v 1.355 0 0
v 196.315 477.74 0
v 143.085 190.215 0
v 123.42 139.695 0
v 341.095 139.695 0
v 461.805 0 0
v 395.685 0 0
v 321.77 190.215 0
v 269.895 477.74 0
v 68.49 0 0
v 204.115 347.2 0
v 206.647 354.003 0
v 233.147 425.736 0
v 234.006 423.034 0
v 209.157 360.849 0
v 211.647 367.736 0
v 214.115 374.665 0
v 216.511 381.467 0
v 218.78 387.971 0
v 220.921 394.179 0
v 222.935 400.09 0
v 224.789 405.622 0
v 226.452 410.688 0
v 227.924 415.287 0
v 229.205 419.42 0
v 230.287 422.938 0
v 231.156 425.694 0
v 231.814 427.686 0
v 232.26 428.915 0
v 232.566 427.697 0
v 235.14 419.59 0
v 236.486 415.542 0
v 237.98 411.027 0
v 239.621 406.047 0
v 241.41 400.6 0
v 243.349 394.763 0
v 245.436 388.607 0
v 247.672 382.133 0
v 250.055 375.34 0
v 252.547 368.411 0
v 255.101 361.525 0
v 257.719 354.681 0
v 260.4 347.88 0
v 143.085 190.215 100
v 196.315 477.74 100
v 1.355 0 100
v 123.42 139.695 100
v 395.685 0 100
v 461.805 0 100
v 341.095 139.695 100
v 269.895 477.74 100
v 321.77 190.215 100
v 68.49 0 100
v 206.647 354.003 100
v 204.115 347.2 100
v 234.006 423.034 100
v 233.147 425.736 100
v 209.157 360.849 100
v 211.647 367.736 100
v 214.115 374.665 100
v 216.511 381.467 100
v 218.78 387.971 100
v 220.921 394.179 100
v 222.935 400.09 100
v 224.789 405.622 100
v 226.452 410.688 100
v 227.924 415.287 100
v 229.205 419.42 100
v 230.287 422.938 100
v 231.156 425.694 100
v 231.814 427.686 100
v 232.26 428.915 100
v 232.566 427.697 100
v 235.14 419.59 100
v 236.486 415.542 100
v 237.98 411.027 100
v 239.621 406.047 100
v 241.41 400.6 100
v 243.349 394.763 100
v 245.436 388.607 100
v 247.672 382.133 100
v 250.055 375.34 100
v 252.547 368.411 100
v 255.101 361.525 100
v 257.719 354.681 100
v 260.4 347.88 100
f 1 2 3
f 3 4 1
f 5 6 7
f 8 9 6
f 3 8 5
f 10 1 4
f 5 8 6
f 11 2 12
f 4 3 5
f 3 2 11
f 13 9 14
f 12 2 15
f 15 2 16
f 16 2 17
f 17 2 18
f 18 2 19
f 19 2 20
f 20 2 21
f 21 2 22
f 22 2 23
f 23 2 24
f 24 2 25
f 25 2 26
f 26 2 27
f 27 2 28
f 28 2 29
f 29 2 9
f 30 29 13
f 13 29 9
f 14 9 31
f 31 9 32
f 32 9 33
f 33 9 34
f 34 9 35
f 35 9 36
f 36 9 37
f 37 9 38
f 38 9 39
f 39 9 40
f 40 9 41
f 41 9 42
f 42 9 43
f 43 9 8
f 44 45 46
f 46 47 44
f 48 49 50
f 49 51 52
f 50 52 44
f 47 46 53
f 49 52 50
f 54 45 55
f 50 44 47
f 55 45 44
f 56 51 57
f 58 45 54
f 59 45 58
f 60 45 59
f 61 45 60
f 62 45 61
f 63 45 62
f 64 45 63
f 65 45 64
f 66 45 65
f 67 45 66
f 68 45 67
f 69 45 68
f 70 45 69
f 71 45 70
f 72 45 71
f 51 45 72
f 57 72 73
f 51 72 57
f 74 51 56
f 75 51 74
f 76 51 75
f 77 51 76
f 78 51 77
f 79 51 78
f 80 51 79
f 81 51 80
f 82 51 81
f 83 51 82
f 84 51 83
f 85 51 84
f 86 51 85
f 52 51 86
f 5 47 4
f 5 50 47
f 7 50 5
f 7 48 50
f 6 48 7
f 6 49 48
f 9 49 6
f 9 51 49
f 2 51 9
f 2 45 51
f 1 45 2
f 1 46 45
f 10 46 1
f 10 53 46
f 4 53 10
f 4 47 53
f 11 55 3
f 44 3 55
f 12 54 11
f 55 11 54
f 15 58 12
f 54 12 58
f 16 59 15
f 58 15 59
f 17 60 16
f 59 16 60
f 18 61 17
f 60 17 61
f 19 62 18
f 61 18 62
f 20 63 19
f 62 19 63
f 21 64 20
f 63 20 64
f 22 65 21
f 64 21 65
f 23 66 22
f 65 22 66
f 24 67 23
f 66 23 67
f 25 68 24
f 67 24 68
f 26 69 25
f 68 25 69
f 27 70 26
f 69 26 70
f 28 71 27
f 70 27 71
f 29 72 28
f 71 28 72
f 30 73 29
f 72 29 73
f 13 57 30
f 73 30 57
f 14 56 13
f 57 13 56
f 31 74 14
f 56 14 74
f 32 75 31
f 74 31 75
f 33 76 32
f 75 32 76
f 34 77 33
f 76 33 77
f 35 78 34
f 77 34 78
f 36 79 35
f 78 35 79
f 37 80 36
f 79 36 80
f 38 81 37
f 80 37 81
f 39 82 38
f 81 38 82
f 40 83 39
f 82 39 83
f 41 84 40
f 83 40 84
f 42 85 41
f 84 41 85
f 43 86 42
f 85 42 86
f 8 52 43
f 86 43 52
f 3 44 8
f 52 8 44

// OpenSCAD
//
// (doxygen) file header.
//

/***************************************************************************//**
  \file   design.scad
  \author Designers' Name
  \date   2016-2017

  \copyright
    Copyright notice.

  \brief
    Short design description.

  \details
    Long design description.

    \amu_make png_files ( append=scope1 extension=png ++pstarget )
    \amu_shell file_cnt ( "echo ${png_files} | wc -w" )
    \amu_shell   labels ( "seq -f '(%g)' -s '^' ${file_cnt}" )

    \htmlonly
      \amu_image_table
        (
          type=html columns=6 image_width="160"
          table_caption="Design Examples"
          cell_files="${png_files}"
          cell_captions="${labels}"
        )
    \endhtmlonly

    \amu_make eps_files ( append=scope1 extension=png2eps ++pstarget )
    \latexonly
      \amu_image_table
        (
          type=latex columns=6 image_width="1.00in"
          table_caption="Design Examples"
          cell_files="${eps_files}"
          cell_captions="${labels}"
        )
    \endlatexonly

*******************************************************************************/


//
// (doxygen) main page.
//

/***************************************************************************//**
  \mainpage Main Page
  \tableofcontents

  \section overview Overview
    Overview.

  \subsection design Design

    \ref design.scad "Design Documentation."

    \amu_combine    titles ( "v10 v11 v12" "x" "1 2" joiner=" " separator="^" )
    \amu_make    stl_files ( append=scope1 extension=stl ++pstarget )

    \amu_combine png_files ( prefix="design" "v10 v11 v12" "1 2" "diag_320x240.png" )
    \htmlonly
      \amu_image_table
        (
          type=html columns=2 image_width="160"
          table_caption="Downloadable STL"
          column_headings="Scale=1^Scale=2"
          cell_files="${png_files}"
          cell_titles="${titles}"
          cell_captions="${titles}"
          cell_urls="${stl_files}"
        )
    \endhtmlonly

    \amu_combine eps_files ( prefix="design" "v10 v11 v12" "1 2" "diag_320x240.eps" )
    \latexonly
      \amu_image_table
        (
          type=latex columns=2 image_width="1.00in"
          table_caption="Downloadable STL"
          column_headings="Scale=1^Scale=2"
          cell_files="${eps_files}"
          cell_titles="${titles}"
          cell_captions="${titles}"
          cell_urls="${stl_files}"
        )
    \endlatexonly

  \subsection library Library

    \ref library.scad "Library Documentation."

    \amu_shell        seq4 ( "seq -f '(%g)' -s '^' 4" )
    \amu_combine    titles ( prefix="Example" "A B C D" suffix="." joiner=" " separator="^" )
    \amu_make    stl_files ( set="library" append=scope1 extension=stl )

    \amu_combine png_files ( prefix="library_scope2" "A B C D" "2" "diag_320x240.png" )
    \htmlonly
      \amu_image_table
        (
          type=html columns=4 image_width="160"
          table_caption="Downloadable STL"
          column_headings="${seq4}"
          cell_files="${png_files}"
          cell_titles="${titles}"
          cell_captions="${titles}"
          cell_urls="${stl_files}"
        )
    \endhtmlonly

    \amu_combine eps_files ( prefix="library_scope2" "A B C D" "2" "diag_320x240.eps" )
    \latexonly
      \amu_image_table
        (
          type=latex columns=4 image_width="1.00in"
          table_caption="Downloadable STL"
          column_headings="${seq4}"
          cell_files="${eps_files}"
          cell_titles="${titles}"
          cell_captions="${titles}"
          cell_urls="${stl_files}"
        )
    \endlatexonly

  \section references References

    \amu_table
      (
        id="textid" columns="2"
        column_headings="Left^Right"
        cell_texts="
          OpenSCAD Home Page^
          openscad-amu on Github^
          Doxygen Home Page^
          GNU Make Documentation"
        cell_urls="
          http://www.openscad.org
          https://github.com/royasutton/openscad-amu
          http://www.stack.nl/~dimitri/doxygen
          https://www.gnu.org/software/make
        "
      )

    \amu_date compiled ( Day dash Month dash year
                         space string at space
                         hour colon minute colon second )

    Compiled: \amu_eval ( ${compiled} ).

  \note design.scad contains global members, but library.scad does not.

  \warning global members should ordinarily be avoided in libraries. using
           modules and/or functions with parameters facilitates reuse.

  \todo remaining documentation.
*******************************************************************************/


//
// (doxygen) examples.
//

/***************************************************************************//**
  \example design_logo.bash extracted auxiliary build script.
  \example design_logo.makefile generated scope makefile.

  \example design_scope1.bash extracted auxiliary build script.
  \example design_scope1.makefile generated scope makefile.

  \example library_scope1.bash extracted auxiliary build script.
  \example library_scope1.scad extracted auxiliary modeling script.
  \example library_scope1.makefile generated scope makefile.

  \example library_scope2.bash extracted auxiliary build script.
  \example library_scope2.scad extracted auxiliary modeling script.
  \example library_scope2.makefile generated scope makefile.
*******************************************************************************/


//
// (openscad) functions and modules.
//

//! design module one short description.
/***************************************************************************//**
  \param p1   <string>  parameter one.
  \param p2   <integer> parameter two.

  \details
    design module one long description.

  \todo complete design.
  \protected
*******************************************************************************/
module dm1( p1="X", p2=10 ) {
  linear_extrude(height=p2*10)
  text(text=p1, size=p2*50);
}


//
// (openscad) globals.
//

design_str="A";   ///< A string with the text to render.
design_int=10;    ///< An integer scaling factor for the text.

dm1(p1=design_str, p2=design_int);


//
// (openscad-amu) auxiliary build script, two scopes.
//

/***************************************************************************//**
Begin_Scope logo;
  Begin_MFScript;
    defines Name "str" Define "design_str" Strings "logo";
    views   Name "views" Translate "650,180,50" Distance "1700" Views "top";
    images  Name "sizes" Aspect "4:1" Xsizes "200";

    variables
      set_Makefile "${__MAKE_FILE__}"  add_Depend "${__MAKE_FILE__}"
      set_Source "${__SOURCE_FILE__}"  set_Prefix "${__PREFIX__}"

      set_Ext "png"
      set_Convert_Exts "eps"  set_Convert_Opts "-verbose"
      set_Opts "--preview --projection=p"
      set_Opts_Combine "str views sizes";

    script Begin_Makefile Summary  Tables  Targets  Menu End_Makefile;
  End_MFScript;
End_Scope;

Begin_Scope scope1;
  Begin_MFScript;
    defines Name "str" Define "design_str" Strings "v10 v11 v12";
    defines Name "int" Define "design_int" Integers "1 2";
    views   Name "views" Distance "100" Views "top bottom diag";
    images  Name "sizes" Aspect "4:3" Wsizes "320";

    variables
      set_Makefile "${__MAKE_FILE__}"  add_Depend "${__MAKE_FILE__}"
      set_Source "${__SOURCE_FILE__}"  set_Prefix "${__PREFIX__}"

      set_Ext "png"
      set_Convert_Exts "eps"  set_Convert_Opts "-verbose"
      set_Opts "--preview --projection=o --viewall --autocenter"
      set_Opts_Combine "str int views sizes";

    script
      Begin_Makefile_New
        Include_Copy "${__AMU_INCLUDE_PATH__}/parallel_jobs.mk"
        Summary  Tables  Targets  Menu_Ext
      End_Makefile;

    variables
      Set_Ext "stl"
      Clear_Convert
      Set_Opts "--render"
      Set_Opts_Combine "str int";

    script
      Begin_Makefile_Append
        Summary  Tables  Targets  Menu_Ext  Menu_Src  Menu_All
      End_Makefile;
  End_MFScript;
End_Scope;
*******************************************************************************/


////////////////////////////////////////////////////////////////////////////////
// end of file
////////////////////////////////////////////////////////////////////////////////
